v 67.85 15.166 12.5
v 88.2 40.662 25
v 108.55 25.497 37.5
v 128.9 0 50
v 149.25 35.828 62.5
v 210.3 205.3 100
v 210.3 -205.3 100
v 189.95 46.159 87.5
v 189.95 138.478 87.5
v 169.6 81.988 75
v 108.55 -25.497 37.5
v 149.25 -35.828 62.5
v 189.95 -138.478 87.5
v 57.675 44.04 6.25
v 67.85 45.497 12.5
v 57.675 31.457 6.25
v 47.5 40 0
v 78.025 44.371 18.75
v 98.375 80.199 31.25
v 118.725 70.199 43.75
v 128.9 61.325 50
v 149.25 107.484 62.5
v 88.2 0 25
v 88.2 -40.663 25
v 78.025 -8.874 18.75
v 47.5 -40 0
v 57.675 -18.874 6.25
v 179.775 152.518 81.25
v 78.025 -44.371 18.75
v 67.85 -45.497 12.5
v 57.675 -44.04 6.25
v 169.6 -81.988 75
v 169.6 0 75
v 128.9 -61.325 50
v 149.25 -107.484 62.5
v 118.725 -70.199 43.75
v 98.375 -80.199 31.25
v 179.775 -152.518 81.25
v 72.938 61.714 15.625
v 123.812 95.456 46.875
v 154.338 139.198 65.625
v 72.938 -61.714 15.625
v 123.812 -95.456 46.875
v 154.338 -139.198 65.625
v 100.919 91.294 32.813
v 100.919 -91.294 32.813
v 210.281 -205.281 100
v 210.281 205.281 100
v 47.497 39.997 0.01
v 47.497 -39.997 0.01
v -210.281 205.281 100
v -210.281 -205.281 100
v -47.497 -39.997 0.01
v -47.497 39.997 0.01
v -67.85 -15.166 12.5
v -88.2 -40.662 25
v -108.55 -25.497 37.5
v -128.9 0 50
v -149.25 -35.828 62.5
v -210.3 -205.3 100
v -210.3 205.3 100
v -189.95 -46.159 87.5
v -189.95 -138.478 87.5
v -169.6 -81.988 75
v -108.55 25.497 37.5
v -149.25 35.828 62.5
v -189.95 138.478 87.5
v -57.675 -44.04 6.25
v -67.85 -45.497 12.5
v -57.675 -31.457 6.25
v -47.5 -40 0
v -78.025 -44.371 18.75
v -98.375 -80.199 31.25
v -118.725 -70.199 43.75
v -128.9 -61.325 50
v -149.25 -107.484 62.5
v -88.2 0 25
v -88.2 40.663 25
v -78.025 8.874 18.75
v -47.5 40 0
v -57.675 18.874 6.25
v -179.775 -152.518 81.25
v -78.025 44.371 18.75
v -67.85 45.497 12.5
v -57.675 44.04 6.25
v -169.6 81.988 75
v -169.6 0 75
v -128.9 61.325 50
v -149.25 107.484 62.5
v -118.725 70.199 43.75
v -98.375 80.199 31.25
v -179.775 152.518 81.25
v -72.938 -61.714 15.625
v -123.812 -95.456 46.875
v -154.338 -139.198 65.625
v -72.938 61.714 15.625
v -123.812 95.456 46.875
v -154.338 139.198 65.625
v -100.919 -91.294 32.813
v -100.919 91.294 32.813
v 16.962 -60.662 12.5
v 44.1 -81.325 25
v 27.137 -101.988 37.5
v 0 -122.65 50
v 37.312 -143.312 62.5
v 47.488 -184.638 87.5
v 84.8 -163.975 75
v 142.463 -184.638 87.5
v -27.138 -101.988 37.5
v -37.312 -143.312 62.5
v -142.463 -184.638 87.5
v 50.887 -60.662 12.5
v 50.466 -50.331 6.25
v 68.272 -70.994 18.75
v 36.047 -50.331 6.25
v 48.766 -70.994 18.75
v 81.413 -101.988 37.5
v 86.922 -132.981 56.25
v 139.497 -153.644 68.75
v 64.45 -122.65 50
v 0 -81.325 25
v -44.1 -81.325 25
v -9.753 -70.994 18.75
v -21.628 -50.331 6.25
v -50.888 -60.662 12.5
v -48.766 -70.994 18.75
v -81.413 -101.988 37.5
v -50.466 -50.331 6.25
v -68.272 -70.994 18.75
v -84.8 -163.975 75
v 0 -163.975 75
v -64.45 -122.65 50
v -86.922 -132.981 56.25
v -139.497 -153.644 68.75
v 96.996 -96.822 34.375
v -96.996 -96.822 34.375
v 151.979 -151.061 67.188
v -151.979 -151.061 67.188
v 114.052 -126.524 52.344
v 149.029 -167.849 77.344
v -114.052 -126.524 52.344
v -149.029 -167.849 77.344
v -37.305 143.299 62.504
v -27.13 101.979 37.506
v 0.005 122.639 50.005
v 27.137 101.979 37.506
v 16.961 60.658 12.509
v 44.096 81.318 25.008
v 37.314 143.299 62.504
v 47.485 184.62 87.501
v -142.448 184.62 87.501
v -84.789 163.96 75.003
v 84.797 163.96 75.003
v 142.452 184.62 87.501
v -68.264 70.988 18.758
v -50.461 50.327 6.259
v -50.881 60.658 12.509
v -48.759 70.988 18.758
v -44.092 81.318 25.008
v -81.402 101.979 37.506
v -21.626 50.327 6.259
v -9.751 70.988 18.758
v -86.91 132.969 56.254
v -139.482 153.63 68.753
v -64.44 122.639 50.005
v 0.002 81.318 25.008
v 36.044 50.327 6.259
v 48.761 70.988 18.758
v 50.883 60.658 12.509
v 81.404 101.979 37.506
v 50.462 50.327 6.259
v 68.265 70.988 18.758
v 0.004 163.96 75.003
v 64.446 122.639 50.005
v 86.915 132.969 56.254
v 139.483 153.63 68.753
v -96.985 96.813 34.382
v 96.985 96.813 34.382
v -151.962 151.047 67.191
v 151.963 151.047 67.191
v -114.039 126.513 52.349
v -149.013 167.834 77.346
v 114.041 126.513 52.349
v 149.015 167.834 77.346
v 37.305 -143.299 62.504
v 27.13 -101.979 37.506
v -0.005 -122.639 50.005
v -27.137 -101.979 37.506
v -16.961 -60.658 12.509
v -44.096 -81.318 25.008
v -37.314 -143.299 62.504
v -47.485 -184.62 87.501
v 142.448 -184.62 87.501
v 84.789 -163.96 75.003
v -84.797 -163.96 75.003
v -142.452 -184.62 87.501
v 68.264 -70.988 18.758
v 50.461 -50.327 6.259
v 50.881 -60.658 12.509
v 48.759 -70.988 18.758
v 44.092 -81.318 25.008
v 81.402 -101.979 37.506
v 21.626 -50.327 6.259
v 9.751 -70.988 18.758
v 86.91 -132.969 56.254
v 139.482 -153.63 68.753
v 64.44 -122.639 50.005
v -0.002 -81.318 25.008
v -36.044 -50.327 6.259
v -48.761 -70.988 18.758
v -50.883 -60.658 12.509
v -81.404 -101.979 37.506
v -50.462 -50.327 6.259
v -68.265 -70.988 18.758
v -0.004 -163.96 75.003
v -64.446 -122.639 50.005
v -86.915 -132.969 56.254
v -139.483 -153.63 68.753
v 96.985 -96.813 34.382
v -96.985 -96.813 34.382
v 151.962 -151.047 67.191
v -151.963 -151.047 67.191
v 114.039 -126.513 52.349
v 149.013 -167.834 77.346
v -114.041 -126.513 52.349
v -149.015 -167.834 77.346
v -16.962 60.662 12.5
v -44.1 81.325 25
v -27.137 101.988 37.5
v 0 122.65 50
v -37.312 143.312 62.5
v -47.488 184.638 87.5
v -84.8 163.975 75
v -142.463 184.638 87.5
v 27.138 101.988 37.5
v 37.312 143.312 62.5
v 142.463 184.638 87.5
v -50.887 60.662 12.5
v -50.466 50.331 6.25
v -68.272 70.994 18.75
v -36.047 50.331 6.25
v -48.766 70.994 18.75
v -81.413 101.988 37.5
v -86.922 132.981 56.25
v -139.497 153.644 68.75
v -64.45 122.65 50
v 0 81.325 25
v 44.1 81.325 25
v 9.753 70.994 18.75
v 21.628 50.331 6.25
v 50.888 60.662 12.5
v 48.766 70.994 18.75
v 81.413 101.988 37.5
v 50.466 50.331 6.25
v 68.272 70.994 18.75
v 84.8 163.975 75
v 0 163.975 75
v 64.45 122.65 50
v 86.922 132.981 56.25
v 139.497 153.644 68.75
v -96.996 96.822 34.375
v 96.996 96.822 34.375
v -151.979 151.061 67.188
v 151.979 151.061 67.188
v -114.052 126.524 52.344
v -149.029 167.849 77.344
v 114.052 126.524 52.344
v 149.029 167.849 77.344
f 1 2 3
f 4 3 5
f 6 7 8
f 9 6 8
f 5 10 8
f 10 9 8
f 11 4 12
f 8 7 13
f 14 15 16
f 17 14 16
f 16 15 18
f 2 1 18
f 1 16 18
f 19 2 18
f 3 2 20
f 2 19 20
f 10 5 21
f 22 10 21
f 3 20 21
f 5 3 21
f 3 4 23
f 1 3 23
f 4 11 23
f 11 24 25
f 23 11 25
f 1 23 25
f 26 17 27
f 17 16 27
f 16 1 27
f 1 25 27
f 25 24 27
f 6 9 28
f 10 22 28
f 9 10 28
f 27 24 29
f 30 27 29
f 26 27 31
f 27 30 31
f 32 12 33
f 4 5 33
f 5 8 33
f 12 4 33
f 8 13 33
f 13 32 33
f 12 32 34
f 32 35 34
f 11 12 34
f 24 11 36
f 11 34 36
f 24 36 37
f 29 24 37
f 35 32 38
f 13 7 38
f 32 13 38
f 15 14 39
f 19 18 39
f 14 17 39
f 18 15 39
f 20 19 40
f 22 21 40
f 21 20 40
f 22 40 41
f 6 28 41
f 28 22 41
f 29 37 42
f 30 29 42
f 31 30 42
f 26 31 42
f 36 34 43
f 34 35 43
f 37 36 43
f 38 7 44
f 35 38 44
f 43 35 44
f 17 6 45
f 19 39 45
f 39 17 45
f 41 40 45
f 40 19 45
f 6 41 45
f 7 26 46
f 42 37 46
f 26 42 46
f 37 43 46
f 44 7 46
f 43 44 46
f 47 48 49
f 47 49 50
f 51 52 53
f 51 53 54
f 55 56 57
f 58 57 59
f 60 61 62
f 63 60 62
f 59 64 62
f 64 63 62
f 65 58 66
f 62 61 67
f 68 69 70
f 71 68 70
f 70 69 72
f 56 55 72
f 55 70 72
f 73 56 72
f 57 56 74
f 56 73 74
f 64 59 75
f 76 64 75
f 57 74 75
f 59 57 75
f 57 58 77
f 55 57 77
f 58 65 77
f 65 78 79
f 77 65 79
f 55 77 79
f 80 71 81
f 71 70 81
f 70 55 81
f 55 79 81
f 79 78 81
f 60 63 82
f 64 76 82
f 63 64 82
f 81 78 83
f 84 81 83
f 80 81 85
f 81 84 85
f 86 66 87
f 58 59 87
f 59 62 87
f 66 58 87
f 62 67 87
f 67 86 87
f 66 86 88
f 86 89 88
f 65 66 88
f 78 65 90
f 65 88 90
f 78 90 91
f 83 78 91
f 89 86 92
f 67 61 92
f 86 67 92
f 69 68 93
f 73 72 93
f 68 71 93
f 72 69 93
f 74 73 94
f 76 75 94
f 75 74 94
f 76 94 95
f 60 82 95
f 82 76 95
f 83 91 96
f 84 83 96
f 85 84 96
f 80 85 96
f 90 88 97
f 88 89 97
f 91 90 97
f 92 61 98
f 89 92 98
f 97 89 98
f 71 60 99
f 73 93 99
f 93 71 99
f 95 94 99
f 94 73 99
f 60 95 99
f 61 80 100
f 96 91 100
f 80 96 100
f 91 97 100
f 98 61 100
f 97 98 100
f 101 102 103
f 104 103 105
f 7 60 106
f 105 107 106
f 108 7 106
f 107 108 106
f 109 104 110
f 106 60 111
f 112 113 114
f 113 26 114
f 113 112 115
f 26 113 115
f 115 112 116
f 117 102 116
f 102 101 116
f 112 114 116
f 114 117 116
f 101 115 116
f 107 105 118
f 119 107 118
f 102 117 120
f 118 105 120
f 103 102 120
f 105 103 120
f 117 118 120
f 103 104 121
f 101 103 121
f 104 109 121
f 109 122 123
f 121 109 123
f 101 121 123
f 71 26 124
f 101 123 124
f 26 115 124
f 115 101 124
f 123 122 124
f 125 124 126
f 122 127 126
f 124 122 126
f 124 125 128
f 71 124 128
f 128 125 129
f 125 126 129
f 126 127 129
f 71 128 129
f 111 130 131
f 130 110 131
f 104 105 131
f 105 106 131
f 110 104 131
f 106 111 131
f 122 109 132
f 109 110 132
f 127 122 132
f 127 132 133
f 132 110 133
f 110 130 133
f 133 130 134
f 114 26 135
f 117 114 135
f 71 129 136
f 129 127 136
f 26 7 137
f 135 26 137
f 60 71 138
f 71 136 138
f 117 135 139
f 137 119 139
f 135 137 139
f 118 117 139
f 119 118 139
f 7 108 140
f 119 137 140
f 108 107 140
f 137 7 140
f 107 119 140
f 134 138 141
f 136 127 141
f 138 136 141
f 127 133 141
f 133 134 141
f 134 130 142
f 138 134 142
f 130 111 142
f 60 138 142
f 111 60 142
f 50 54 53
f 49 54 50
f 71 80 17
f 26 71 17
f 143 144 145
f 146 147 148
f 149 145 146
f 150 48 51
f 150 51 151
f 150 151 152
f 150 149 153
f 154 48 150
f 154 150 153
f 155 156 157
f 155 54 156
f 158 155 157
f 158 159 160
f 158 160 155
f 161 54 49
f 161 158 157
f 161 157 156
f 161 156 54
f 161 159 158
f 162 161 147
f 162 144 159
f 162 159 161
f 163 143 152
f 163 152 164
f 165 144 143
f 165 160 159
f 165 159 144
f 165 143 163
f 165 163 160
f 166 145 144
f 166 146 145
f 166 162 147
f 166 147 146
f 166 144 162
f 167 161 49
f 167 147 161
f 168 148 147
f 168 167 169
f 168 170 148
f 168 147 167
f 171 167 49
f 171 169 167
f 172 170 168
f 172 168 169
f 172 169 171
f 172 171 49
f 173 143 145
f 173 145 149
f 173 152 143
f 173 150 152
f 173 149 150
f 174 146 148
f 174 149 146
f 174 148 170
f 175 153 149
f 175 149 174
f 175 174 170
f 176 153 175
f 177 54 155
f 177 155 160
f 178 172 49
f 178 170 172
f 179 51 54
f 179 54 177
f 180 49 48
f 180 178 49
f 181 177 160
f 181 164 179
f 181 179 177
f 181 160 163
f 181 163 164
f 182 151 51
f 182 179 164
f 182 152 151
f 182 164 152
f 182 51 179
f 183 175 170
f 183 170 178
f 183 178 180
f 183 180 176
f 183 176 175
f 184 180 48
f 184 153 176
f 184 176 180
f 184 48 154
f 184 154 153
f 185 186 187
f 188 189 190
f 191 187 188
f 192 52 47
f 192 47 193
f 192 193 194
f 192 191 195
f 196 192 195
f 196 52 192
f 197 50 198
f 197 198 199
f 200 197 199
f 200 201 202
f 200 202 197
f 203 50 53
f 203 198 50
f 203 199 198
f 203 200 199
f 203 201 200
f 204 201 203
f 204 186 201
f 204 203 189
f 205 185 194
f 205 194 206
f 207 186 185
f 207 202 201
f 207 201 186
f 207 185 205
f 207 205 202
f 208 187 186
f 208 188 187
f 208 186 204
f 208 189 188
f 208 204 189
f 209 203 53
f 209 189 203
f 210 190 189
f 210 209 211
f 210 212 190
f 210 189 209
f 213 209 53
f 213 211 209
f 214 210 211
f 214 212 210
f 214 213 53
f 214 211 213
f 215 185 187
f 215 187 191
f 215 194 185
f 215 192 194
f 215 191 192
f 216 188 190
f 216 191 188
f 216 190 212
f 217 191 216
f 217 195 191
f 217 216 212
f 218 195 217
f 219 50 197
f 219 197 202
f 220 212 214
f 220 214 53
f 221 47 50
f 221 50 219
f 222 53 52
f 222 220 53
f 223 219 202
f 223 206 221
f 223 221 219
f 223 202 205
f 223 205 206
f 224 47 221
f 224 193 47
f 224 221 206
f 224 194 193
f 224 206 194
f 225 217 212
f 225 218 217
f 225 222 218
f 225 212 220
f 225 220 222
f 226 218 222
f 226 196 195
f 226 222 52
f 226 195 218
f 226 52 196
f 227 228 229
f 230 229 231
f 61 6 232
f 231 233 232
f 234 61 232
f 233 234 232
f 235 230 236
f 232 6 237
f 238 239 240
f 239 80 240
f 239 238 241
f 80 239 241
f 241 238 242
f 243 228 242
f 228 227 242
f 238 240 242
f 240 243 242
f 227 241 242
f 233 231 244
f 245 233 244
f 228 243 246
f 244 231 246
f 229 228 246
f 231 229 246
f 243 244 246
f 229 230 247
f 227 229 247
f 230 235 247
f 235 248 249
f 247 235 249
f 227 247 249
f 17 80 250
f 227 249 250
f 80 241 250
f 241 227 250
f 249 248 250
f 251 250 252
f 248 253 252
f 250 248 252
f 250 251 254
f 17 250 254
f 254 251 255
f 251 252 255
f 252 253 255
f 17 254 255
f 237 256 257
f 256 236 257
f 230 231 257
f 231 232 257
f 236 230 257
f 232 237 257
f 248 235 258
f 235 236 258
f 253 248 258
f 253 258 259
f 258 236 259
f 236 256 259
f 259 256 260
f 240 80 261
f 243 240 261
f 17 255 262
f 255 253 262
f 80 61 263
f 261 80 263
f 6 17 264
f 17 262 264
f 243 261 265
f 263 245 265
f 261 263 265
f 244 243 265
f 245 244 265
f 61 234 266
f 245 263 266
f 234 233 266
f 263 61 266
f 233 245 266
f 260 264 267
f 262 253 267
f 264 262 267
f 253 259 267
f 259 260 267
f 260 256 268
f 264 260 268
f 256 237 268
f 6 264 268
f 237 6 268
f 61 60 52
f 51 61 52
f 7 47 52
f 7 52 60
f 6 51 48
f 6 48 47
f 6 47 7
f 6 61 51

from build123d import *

# Parameters (mm, degrees)
SHELL_1_T = -0.01


with BuildPart() as part:
    # 草图3 → 放样1 section 0
    with BuildSketch(Plane.XY):
        with BuildLine():
            Line((-47.5, 40), (47.5, 40))
            Line((47.5, 40), (47.5, -40))
            Line((47.5, -40), (-47.5, -40))
            Line((-47.5, -40), (-47.5, 40))
        make_face()
    # 草图4 → 放样1 section 1
    with BuildSketch(Plane.XY.offset(100)):
        with BuildLine():
            Line((-210.3, 205.3), (210.3, 205.3))
            Line((210.3, 205.3), (210.3, -205.3))
            Line((210.3, -205.3), (-210.3, -205.3))
            Line((-210.3, -205.3), (-210.3, 205.3))
        make_face()
    loft()

    # 抽壳1
    shell_1_openings = [part.faces().sort_by_distance(p)[0] for p in [
        (0, 0, 100),
    ]]
    offset(amount=SHELL_1_T, openings=shell_1_openings)


solid = part.part
